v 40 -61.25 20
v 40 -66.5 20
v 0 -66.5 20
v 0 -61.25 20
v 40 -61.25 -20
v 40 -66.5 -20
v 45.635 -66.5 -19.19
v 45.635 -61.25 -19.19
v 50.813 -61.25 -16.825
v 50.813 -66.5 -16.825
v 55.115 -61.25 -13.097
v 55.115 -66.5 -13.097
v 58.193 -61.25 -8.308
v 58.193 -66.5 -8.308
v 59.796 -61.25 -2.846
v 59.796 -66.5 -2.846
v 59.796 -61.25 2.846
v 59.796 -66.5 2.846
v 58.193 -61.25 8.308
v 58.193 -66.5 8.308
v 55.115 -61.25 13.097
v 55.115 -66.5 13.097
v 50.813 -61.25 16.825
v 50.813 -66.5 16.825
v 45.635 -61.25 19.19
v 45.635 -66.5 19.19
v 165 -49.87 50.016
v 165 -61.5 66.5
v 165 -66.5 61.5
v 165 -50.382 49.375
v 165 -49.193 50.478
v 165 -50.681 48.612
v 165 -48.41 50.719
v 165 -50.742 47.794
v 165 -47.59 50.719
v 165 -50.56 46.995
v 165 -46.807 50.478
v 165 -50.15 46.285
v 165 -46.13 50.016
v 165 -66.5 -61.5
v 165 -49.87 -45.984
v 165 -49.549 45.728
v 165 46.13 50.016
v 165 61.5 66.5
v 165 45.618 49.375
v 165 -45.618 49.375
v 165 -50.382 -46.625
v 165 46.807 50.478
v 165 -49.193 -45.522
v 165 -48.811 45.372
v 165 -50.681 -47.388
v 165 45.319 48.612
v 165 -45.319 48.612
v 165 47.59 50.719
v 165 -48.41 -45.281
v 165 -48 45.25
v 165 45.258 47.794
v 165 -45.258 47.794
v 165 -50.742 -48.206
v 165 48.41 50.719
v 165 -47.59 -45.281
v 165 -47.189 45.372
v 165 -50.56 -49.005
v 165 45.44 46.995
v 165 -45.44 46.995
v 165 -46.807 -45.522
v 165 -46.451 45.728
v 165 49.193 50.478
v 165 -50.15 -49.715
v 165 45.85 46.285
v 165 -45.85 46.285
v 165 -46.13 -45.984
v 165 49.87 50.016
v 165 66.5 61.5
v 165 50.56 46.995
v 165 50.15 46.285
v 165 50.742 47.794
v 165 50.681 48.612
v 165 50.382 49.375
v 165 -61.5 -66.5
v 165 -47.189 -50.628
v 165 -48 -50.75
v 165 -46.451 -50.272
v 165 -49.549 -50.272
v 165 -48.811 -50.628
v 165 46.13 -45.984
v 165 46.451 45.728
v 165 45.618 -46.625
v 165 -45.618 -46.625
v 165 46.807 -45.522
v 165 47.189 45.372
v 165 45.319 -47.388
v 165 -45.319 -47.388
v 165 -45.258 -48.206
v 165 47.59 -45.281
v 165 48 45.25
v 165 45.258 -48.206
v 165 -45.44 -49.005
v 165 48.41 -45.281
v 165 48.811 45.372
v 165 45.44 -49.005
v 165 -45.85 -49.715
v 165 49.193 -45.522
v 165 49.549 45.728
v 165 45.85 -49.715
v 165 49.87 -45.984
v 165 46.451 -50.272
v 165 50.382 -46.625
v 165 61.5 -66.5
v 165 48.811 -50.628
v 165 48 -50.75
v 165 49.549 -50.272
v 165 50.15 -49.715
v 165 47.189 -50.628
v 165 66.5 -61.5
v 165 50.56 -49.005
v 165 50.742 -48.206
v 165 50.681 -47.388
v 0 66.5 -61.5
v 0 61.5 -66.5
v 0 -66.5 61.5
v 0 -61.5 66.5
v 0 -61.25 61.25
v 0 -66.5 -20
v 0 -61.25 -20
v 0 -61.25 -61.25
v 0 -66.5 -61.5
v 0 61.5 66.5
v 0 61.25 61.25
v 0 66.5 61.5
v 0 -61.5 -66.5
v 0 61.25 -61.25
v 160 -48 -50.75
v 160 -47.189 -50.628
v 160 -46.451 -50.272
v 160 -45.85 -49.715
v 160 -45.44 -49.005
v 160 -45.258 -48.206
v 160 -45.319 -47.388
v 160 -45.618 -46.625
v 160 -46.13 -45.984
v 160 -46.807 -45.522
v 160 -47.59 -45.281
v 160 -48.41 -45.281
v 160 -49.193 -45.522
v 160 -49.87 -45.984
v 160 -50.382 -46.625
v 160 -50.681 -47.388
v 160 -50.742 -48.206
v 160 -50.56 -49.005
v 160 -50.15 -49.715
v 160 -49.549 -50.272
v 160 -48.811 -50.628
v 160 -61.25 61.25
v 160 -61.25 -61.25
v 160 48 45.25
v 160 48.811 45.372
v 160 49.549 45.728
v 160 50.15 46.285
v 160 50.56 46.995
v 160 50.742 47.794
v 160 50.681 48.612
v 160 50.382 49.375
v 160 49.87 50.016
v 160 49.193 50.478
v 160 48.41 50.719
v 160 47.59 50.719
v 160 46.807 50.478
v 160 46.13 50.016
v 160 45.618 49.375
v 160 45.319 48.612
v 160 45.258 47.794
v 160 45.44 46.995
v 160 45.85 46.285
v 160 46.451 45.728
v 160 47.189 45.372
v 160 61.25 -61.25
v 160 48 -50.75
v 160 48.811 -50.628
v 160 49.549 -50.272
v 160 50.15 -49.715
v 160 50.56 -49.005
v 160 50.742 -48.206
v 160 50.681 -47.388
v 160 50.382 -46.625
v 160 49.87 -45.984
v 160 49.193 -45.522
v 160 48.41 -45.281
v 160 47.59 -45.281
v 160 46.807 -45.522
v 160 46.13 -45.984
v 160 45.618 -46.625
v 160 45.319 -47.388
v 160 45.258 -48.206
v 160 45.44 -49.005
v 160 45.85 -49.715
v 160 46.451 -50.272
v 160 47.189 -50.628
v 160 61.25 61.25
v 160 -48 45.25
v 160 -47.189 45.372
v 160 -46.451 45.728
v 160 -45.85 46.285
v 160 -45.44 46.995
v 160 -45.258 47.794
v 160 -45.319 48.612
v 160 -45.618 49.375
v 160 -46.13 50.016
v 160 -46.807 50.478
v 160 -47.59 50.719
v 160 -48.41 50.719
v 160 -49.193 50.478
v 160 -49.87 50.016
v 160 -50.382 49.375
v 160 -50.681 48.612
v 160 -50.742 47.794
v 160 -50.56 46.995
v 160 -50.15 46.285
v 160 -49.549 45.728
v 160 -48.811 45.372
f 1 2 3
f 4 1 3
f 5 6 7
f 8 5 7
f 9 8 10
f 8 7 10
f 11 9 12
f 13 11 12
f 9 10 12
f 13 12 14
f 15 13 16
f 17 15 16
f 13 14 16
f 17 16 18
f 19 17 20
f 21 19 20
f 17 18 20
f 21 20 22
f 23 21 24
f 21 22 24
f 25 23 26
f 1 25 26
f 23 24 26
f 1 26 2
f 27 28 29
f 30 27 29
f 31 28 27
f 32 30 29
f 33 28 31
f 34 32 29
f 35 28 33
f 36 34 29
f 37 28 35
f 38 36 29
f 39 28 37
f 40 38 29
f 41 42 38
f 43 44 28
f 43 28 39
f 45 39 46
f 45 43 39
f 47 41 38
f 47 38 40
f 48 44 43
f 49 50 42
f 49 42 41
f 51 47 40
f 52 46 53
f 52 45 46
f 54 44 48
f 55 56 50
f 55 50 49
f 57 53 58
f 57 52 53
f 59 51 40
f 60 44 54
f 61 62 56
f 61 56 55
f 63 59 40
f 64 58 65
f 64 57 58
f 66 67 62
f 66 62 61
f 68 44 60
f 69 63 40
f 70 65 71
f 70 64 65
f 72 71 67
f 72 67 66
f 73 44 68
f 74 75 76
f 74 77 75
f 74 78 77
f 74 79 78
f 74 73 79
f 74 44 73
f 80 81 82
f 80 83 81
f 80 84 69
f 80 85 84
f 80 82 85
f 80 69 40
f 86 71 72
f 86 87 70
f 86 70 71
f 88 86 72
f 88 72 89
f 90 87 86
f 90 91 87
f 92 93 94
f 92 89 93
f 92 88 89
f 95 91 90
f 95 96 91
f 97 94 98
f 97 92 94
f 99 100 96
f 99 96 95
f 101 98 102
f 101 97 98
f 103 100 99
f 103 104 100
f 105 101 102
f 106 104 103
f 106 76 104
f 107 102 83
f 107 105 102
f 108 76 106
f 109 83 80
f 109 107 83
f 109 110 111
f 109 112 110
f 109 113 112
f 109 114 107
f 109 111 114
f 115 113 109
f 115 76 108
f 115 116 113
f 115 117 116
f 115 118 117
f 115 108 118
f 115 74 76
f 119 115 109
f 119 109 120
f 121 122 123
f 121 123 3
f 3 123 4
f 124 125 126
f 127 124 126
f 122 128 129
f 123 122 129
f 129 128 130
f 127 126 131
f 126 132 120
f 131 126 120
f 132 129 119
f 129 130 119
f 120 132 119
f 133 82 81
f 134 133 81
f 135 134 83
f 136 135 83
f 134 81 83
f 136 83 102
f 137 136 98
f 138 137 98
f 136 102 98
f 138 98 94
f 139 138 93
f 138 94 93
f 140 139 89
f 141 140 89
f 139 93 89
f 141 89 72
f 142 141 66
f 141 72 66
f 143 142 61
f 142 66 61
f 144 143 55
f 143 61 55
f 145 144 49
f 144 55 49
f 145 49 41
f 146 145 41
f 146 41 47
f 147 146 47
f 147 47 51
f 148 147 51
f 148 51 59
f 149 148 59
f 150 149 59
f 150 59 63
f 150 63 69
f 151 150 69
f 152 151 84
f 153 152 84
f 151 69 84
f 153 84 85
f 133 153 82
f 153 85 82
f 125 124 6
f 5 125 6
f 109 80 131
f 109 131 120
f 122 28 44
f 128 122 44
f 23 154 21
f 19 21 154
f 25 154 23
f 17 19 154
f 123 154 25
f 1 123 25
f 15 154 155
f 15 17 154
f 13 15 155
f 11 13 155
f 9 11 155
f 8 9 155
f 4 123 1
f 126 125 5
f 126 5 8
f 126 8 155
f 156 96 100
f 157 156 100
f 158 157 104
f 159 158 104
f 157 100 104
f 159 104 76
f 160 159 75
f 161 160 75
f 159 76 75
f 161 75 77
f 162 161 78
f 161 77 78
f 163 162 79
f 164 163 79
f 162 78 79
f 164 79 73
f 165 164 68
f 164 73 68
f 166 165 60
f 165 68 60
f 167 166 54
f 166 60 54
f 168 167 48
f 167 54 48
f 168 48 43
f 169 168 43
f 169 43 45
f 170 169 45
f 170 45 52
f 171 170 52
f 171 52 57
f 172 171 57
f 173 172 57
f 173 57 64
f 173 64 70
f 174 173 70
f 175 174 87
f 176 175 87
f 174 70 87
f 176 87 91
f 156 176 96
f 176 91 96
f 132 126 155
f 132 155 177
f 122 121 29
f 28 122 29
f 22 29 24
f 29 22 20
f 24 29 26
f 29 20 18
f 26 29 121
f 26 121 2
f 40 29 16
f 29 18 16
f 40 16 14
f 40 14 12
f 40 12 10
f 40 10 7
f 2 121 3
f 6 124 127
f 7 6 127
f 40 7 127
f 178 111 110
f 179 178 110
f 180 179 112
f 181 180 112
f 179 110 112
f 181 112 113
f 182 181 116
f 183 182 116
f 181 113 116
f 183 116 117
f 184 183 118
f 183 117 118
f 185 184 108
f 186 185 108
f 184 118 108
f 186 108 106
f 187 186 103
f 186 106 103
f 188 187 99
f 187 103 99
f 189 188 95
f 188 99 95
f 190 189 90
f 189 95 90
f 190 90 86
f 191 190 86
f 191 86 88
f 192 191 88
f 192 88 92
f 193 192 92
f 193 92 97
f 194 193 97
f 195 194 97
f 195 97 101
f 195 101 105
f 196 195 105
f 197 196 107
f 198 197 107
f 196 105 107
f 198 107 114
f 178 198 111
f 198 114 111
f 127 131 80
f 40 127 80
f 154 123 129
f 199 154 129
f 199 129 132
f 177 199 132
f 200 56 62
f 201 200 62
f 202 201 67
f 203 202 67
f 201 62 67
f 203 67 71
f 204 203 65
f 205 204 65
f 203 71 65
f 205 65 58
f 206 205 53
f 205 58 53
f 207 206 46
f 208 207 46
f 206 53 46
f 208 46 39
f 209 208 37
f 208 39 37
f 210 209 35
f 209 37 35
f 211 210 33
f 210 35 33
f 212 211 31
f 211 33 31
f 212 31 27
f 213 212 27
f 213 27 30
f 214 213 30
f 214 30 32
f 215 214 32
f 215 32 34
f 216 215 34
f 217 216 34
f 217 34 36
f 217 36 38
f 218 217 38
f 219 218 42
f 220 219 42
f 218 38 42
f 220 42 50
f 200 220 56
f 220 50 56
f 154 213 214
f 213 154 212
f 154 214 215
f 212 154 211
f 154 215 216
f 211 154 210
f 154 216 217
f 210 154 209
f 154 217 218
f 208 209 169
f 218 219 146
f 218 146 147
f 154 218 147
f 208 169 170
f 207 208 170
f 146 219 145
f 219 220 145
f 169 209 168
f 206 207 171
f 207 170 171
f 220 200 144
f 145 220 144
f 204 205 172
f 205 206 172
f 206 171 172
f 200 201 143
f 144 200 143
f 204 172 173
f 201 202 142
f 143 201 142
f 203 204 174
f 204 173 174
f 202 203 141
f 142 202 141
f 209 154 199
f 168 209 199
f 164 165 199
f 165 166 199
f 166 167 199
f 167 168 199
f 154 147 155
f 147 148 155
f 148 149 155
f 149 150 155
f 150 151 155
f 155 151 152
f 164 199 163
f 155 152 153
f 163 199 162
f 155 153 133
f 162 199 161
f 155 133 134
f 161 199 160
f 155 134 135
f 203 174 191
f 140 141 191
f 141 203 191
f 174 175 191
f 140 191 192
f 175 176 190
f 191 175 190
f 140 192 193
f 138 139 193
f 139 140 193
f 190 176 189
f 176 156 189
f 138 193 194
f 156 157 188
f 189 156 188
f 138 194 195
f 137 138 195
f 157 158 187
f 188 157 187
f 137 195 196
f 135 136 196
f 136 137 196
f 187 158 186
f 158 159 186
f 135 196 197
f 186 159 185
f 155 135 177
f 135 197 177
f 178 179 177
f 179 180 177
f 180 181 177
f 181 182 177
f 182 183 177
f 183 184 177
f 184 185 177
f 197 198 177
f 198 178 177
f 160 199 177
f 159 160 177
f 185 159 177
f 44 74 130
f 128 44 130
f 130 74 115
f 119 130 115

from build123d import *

# Parameters (mm, degrees)
SKETCH_1_W          = 133
SKETCH_1_H          = 133
SKETCH_1_W_2        = 122.5
SKETCH_1_H_2        = 122.5
EXTRUDE_1_DEPTH     = 160
SKETCH_2_W          = 133
SKETCH_2_H          = 133
EXTRUDE_2_DEPTH     = 5
CHAMFER_1_SIZE      = 5
SKETCH_3_R          = 2.75
CUT_EXTRUDE_1_DEPTH = 5
CUT_EXTRUDE_2_DEPTH = 10


with BuildPart() as part:
    # 草图1 → 凸台-拉伸1 (new body)
    with BuildSketch(Plane(origin=(0, 0, 0), x_dir=(0, 0, -1), z_dir=(1, 0, 0))):
        Rectangle(SKETCH_1_W, SKETCH_1_H)
        Rectangle(SKETCH_1_W_2, SKETCH_1_H_2, mode=Mode.SUBTRACT)
    extrude(amount=EXTRUDE_1_DEPTH)

    # 草图2 → 凸台-拉伸2 (add)
    with BuildSketch(Plane(origin=(160, 0, 0), x_dir=(0, 0, -1), z_dir=(1, 0, 0))):
        Rectangle(SKETCH_2_W, SKETCH_2_H)
    extrude(amount=EXTRUDE_2_DEPTH)

    # 倒角1
    chamfer_1_edges = [part.edges().sort_by_distance(p)[0] for p in [
        (82.5, 66.5, 66.5),
        (82.5, 66.5, -66.5),
        (82.5, -66.5, -66.5),
        (82.5, -66.5, 66.5),
    ]]
    chamfer(chamfer_1_edges, length=CHAMFER_1_SIZE)

    # 草图3 → 切除-拉伸1 (cut)
    with BuildSketch(Plane(origin=(165, 0, 0), x_dir=(0, 0, -1), z_dir=(1, 0, 0))):
        with Locations((48, 48)):
            Circle(SKETCH_3_R)
        with Locations((48, -48)):
            Circle(SKETCH_3_R)
        with Locations((-48, -48)):
            Circle(SKETCH_3_R)
        with Locations((-48, 48)):
            Circle(SKETCH_3_R)
    extrude(amount=-CUT_EXTRUDE_1_DEPTH, mode=Mode.SUBTRACT)

    # 草图4 → 切除-拉伸2 (cut)
    with BuildSketch(Plane.XZ.offset(66.5)):
        with BuildLine():
            Line((40, 20), (0, 20))
            Line((0, 20), (0, -20))
            Line((0, -20), (40, -20))
            ThreePointArc((40, -20), (60, 0), (40, 20))
        make_face()
    extrude(amount=-CUT_EXTRUDE_2_DEPTH, mode=Mode.SUBTRACT)


solid = part.part
